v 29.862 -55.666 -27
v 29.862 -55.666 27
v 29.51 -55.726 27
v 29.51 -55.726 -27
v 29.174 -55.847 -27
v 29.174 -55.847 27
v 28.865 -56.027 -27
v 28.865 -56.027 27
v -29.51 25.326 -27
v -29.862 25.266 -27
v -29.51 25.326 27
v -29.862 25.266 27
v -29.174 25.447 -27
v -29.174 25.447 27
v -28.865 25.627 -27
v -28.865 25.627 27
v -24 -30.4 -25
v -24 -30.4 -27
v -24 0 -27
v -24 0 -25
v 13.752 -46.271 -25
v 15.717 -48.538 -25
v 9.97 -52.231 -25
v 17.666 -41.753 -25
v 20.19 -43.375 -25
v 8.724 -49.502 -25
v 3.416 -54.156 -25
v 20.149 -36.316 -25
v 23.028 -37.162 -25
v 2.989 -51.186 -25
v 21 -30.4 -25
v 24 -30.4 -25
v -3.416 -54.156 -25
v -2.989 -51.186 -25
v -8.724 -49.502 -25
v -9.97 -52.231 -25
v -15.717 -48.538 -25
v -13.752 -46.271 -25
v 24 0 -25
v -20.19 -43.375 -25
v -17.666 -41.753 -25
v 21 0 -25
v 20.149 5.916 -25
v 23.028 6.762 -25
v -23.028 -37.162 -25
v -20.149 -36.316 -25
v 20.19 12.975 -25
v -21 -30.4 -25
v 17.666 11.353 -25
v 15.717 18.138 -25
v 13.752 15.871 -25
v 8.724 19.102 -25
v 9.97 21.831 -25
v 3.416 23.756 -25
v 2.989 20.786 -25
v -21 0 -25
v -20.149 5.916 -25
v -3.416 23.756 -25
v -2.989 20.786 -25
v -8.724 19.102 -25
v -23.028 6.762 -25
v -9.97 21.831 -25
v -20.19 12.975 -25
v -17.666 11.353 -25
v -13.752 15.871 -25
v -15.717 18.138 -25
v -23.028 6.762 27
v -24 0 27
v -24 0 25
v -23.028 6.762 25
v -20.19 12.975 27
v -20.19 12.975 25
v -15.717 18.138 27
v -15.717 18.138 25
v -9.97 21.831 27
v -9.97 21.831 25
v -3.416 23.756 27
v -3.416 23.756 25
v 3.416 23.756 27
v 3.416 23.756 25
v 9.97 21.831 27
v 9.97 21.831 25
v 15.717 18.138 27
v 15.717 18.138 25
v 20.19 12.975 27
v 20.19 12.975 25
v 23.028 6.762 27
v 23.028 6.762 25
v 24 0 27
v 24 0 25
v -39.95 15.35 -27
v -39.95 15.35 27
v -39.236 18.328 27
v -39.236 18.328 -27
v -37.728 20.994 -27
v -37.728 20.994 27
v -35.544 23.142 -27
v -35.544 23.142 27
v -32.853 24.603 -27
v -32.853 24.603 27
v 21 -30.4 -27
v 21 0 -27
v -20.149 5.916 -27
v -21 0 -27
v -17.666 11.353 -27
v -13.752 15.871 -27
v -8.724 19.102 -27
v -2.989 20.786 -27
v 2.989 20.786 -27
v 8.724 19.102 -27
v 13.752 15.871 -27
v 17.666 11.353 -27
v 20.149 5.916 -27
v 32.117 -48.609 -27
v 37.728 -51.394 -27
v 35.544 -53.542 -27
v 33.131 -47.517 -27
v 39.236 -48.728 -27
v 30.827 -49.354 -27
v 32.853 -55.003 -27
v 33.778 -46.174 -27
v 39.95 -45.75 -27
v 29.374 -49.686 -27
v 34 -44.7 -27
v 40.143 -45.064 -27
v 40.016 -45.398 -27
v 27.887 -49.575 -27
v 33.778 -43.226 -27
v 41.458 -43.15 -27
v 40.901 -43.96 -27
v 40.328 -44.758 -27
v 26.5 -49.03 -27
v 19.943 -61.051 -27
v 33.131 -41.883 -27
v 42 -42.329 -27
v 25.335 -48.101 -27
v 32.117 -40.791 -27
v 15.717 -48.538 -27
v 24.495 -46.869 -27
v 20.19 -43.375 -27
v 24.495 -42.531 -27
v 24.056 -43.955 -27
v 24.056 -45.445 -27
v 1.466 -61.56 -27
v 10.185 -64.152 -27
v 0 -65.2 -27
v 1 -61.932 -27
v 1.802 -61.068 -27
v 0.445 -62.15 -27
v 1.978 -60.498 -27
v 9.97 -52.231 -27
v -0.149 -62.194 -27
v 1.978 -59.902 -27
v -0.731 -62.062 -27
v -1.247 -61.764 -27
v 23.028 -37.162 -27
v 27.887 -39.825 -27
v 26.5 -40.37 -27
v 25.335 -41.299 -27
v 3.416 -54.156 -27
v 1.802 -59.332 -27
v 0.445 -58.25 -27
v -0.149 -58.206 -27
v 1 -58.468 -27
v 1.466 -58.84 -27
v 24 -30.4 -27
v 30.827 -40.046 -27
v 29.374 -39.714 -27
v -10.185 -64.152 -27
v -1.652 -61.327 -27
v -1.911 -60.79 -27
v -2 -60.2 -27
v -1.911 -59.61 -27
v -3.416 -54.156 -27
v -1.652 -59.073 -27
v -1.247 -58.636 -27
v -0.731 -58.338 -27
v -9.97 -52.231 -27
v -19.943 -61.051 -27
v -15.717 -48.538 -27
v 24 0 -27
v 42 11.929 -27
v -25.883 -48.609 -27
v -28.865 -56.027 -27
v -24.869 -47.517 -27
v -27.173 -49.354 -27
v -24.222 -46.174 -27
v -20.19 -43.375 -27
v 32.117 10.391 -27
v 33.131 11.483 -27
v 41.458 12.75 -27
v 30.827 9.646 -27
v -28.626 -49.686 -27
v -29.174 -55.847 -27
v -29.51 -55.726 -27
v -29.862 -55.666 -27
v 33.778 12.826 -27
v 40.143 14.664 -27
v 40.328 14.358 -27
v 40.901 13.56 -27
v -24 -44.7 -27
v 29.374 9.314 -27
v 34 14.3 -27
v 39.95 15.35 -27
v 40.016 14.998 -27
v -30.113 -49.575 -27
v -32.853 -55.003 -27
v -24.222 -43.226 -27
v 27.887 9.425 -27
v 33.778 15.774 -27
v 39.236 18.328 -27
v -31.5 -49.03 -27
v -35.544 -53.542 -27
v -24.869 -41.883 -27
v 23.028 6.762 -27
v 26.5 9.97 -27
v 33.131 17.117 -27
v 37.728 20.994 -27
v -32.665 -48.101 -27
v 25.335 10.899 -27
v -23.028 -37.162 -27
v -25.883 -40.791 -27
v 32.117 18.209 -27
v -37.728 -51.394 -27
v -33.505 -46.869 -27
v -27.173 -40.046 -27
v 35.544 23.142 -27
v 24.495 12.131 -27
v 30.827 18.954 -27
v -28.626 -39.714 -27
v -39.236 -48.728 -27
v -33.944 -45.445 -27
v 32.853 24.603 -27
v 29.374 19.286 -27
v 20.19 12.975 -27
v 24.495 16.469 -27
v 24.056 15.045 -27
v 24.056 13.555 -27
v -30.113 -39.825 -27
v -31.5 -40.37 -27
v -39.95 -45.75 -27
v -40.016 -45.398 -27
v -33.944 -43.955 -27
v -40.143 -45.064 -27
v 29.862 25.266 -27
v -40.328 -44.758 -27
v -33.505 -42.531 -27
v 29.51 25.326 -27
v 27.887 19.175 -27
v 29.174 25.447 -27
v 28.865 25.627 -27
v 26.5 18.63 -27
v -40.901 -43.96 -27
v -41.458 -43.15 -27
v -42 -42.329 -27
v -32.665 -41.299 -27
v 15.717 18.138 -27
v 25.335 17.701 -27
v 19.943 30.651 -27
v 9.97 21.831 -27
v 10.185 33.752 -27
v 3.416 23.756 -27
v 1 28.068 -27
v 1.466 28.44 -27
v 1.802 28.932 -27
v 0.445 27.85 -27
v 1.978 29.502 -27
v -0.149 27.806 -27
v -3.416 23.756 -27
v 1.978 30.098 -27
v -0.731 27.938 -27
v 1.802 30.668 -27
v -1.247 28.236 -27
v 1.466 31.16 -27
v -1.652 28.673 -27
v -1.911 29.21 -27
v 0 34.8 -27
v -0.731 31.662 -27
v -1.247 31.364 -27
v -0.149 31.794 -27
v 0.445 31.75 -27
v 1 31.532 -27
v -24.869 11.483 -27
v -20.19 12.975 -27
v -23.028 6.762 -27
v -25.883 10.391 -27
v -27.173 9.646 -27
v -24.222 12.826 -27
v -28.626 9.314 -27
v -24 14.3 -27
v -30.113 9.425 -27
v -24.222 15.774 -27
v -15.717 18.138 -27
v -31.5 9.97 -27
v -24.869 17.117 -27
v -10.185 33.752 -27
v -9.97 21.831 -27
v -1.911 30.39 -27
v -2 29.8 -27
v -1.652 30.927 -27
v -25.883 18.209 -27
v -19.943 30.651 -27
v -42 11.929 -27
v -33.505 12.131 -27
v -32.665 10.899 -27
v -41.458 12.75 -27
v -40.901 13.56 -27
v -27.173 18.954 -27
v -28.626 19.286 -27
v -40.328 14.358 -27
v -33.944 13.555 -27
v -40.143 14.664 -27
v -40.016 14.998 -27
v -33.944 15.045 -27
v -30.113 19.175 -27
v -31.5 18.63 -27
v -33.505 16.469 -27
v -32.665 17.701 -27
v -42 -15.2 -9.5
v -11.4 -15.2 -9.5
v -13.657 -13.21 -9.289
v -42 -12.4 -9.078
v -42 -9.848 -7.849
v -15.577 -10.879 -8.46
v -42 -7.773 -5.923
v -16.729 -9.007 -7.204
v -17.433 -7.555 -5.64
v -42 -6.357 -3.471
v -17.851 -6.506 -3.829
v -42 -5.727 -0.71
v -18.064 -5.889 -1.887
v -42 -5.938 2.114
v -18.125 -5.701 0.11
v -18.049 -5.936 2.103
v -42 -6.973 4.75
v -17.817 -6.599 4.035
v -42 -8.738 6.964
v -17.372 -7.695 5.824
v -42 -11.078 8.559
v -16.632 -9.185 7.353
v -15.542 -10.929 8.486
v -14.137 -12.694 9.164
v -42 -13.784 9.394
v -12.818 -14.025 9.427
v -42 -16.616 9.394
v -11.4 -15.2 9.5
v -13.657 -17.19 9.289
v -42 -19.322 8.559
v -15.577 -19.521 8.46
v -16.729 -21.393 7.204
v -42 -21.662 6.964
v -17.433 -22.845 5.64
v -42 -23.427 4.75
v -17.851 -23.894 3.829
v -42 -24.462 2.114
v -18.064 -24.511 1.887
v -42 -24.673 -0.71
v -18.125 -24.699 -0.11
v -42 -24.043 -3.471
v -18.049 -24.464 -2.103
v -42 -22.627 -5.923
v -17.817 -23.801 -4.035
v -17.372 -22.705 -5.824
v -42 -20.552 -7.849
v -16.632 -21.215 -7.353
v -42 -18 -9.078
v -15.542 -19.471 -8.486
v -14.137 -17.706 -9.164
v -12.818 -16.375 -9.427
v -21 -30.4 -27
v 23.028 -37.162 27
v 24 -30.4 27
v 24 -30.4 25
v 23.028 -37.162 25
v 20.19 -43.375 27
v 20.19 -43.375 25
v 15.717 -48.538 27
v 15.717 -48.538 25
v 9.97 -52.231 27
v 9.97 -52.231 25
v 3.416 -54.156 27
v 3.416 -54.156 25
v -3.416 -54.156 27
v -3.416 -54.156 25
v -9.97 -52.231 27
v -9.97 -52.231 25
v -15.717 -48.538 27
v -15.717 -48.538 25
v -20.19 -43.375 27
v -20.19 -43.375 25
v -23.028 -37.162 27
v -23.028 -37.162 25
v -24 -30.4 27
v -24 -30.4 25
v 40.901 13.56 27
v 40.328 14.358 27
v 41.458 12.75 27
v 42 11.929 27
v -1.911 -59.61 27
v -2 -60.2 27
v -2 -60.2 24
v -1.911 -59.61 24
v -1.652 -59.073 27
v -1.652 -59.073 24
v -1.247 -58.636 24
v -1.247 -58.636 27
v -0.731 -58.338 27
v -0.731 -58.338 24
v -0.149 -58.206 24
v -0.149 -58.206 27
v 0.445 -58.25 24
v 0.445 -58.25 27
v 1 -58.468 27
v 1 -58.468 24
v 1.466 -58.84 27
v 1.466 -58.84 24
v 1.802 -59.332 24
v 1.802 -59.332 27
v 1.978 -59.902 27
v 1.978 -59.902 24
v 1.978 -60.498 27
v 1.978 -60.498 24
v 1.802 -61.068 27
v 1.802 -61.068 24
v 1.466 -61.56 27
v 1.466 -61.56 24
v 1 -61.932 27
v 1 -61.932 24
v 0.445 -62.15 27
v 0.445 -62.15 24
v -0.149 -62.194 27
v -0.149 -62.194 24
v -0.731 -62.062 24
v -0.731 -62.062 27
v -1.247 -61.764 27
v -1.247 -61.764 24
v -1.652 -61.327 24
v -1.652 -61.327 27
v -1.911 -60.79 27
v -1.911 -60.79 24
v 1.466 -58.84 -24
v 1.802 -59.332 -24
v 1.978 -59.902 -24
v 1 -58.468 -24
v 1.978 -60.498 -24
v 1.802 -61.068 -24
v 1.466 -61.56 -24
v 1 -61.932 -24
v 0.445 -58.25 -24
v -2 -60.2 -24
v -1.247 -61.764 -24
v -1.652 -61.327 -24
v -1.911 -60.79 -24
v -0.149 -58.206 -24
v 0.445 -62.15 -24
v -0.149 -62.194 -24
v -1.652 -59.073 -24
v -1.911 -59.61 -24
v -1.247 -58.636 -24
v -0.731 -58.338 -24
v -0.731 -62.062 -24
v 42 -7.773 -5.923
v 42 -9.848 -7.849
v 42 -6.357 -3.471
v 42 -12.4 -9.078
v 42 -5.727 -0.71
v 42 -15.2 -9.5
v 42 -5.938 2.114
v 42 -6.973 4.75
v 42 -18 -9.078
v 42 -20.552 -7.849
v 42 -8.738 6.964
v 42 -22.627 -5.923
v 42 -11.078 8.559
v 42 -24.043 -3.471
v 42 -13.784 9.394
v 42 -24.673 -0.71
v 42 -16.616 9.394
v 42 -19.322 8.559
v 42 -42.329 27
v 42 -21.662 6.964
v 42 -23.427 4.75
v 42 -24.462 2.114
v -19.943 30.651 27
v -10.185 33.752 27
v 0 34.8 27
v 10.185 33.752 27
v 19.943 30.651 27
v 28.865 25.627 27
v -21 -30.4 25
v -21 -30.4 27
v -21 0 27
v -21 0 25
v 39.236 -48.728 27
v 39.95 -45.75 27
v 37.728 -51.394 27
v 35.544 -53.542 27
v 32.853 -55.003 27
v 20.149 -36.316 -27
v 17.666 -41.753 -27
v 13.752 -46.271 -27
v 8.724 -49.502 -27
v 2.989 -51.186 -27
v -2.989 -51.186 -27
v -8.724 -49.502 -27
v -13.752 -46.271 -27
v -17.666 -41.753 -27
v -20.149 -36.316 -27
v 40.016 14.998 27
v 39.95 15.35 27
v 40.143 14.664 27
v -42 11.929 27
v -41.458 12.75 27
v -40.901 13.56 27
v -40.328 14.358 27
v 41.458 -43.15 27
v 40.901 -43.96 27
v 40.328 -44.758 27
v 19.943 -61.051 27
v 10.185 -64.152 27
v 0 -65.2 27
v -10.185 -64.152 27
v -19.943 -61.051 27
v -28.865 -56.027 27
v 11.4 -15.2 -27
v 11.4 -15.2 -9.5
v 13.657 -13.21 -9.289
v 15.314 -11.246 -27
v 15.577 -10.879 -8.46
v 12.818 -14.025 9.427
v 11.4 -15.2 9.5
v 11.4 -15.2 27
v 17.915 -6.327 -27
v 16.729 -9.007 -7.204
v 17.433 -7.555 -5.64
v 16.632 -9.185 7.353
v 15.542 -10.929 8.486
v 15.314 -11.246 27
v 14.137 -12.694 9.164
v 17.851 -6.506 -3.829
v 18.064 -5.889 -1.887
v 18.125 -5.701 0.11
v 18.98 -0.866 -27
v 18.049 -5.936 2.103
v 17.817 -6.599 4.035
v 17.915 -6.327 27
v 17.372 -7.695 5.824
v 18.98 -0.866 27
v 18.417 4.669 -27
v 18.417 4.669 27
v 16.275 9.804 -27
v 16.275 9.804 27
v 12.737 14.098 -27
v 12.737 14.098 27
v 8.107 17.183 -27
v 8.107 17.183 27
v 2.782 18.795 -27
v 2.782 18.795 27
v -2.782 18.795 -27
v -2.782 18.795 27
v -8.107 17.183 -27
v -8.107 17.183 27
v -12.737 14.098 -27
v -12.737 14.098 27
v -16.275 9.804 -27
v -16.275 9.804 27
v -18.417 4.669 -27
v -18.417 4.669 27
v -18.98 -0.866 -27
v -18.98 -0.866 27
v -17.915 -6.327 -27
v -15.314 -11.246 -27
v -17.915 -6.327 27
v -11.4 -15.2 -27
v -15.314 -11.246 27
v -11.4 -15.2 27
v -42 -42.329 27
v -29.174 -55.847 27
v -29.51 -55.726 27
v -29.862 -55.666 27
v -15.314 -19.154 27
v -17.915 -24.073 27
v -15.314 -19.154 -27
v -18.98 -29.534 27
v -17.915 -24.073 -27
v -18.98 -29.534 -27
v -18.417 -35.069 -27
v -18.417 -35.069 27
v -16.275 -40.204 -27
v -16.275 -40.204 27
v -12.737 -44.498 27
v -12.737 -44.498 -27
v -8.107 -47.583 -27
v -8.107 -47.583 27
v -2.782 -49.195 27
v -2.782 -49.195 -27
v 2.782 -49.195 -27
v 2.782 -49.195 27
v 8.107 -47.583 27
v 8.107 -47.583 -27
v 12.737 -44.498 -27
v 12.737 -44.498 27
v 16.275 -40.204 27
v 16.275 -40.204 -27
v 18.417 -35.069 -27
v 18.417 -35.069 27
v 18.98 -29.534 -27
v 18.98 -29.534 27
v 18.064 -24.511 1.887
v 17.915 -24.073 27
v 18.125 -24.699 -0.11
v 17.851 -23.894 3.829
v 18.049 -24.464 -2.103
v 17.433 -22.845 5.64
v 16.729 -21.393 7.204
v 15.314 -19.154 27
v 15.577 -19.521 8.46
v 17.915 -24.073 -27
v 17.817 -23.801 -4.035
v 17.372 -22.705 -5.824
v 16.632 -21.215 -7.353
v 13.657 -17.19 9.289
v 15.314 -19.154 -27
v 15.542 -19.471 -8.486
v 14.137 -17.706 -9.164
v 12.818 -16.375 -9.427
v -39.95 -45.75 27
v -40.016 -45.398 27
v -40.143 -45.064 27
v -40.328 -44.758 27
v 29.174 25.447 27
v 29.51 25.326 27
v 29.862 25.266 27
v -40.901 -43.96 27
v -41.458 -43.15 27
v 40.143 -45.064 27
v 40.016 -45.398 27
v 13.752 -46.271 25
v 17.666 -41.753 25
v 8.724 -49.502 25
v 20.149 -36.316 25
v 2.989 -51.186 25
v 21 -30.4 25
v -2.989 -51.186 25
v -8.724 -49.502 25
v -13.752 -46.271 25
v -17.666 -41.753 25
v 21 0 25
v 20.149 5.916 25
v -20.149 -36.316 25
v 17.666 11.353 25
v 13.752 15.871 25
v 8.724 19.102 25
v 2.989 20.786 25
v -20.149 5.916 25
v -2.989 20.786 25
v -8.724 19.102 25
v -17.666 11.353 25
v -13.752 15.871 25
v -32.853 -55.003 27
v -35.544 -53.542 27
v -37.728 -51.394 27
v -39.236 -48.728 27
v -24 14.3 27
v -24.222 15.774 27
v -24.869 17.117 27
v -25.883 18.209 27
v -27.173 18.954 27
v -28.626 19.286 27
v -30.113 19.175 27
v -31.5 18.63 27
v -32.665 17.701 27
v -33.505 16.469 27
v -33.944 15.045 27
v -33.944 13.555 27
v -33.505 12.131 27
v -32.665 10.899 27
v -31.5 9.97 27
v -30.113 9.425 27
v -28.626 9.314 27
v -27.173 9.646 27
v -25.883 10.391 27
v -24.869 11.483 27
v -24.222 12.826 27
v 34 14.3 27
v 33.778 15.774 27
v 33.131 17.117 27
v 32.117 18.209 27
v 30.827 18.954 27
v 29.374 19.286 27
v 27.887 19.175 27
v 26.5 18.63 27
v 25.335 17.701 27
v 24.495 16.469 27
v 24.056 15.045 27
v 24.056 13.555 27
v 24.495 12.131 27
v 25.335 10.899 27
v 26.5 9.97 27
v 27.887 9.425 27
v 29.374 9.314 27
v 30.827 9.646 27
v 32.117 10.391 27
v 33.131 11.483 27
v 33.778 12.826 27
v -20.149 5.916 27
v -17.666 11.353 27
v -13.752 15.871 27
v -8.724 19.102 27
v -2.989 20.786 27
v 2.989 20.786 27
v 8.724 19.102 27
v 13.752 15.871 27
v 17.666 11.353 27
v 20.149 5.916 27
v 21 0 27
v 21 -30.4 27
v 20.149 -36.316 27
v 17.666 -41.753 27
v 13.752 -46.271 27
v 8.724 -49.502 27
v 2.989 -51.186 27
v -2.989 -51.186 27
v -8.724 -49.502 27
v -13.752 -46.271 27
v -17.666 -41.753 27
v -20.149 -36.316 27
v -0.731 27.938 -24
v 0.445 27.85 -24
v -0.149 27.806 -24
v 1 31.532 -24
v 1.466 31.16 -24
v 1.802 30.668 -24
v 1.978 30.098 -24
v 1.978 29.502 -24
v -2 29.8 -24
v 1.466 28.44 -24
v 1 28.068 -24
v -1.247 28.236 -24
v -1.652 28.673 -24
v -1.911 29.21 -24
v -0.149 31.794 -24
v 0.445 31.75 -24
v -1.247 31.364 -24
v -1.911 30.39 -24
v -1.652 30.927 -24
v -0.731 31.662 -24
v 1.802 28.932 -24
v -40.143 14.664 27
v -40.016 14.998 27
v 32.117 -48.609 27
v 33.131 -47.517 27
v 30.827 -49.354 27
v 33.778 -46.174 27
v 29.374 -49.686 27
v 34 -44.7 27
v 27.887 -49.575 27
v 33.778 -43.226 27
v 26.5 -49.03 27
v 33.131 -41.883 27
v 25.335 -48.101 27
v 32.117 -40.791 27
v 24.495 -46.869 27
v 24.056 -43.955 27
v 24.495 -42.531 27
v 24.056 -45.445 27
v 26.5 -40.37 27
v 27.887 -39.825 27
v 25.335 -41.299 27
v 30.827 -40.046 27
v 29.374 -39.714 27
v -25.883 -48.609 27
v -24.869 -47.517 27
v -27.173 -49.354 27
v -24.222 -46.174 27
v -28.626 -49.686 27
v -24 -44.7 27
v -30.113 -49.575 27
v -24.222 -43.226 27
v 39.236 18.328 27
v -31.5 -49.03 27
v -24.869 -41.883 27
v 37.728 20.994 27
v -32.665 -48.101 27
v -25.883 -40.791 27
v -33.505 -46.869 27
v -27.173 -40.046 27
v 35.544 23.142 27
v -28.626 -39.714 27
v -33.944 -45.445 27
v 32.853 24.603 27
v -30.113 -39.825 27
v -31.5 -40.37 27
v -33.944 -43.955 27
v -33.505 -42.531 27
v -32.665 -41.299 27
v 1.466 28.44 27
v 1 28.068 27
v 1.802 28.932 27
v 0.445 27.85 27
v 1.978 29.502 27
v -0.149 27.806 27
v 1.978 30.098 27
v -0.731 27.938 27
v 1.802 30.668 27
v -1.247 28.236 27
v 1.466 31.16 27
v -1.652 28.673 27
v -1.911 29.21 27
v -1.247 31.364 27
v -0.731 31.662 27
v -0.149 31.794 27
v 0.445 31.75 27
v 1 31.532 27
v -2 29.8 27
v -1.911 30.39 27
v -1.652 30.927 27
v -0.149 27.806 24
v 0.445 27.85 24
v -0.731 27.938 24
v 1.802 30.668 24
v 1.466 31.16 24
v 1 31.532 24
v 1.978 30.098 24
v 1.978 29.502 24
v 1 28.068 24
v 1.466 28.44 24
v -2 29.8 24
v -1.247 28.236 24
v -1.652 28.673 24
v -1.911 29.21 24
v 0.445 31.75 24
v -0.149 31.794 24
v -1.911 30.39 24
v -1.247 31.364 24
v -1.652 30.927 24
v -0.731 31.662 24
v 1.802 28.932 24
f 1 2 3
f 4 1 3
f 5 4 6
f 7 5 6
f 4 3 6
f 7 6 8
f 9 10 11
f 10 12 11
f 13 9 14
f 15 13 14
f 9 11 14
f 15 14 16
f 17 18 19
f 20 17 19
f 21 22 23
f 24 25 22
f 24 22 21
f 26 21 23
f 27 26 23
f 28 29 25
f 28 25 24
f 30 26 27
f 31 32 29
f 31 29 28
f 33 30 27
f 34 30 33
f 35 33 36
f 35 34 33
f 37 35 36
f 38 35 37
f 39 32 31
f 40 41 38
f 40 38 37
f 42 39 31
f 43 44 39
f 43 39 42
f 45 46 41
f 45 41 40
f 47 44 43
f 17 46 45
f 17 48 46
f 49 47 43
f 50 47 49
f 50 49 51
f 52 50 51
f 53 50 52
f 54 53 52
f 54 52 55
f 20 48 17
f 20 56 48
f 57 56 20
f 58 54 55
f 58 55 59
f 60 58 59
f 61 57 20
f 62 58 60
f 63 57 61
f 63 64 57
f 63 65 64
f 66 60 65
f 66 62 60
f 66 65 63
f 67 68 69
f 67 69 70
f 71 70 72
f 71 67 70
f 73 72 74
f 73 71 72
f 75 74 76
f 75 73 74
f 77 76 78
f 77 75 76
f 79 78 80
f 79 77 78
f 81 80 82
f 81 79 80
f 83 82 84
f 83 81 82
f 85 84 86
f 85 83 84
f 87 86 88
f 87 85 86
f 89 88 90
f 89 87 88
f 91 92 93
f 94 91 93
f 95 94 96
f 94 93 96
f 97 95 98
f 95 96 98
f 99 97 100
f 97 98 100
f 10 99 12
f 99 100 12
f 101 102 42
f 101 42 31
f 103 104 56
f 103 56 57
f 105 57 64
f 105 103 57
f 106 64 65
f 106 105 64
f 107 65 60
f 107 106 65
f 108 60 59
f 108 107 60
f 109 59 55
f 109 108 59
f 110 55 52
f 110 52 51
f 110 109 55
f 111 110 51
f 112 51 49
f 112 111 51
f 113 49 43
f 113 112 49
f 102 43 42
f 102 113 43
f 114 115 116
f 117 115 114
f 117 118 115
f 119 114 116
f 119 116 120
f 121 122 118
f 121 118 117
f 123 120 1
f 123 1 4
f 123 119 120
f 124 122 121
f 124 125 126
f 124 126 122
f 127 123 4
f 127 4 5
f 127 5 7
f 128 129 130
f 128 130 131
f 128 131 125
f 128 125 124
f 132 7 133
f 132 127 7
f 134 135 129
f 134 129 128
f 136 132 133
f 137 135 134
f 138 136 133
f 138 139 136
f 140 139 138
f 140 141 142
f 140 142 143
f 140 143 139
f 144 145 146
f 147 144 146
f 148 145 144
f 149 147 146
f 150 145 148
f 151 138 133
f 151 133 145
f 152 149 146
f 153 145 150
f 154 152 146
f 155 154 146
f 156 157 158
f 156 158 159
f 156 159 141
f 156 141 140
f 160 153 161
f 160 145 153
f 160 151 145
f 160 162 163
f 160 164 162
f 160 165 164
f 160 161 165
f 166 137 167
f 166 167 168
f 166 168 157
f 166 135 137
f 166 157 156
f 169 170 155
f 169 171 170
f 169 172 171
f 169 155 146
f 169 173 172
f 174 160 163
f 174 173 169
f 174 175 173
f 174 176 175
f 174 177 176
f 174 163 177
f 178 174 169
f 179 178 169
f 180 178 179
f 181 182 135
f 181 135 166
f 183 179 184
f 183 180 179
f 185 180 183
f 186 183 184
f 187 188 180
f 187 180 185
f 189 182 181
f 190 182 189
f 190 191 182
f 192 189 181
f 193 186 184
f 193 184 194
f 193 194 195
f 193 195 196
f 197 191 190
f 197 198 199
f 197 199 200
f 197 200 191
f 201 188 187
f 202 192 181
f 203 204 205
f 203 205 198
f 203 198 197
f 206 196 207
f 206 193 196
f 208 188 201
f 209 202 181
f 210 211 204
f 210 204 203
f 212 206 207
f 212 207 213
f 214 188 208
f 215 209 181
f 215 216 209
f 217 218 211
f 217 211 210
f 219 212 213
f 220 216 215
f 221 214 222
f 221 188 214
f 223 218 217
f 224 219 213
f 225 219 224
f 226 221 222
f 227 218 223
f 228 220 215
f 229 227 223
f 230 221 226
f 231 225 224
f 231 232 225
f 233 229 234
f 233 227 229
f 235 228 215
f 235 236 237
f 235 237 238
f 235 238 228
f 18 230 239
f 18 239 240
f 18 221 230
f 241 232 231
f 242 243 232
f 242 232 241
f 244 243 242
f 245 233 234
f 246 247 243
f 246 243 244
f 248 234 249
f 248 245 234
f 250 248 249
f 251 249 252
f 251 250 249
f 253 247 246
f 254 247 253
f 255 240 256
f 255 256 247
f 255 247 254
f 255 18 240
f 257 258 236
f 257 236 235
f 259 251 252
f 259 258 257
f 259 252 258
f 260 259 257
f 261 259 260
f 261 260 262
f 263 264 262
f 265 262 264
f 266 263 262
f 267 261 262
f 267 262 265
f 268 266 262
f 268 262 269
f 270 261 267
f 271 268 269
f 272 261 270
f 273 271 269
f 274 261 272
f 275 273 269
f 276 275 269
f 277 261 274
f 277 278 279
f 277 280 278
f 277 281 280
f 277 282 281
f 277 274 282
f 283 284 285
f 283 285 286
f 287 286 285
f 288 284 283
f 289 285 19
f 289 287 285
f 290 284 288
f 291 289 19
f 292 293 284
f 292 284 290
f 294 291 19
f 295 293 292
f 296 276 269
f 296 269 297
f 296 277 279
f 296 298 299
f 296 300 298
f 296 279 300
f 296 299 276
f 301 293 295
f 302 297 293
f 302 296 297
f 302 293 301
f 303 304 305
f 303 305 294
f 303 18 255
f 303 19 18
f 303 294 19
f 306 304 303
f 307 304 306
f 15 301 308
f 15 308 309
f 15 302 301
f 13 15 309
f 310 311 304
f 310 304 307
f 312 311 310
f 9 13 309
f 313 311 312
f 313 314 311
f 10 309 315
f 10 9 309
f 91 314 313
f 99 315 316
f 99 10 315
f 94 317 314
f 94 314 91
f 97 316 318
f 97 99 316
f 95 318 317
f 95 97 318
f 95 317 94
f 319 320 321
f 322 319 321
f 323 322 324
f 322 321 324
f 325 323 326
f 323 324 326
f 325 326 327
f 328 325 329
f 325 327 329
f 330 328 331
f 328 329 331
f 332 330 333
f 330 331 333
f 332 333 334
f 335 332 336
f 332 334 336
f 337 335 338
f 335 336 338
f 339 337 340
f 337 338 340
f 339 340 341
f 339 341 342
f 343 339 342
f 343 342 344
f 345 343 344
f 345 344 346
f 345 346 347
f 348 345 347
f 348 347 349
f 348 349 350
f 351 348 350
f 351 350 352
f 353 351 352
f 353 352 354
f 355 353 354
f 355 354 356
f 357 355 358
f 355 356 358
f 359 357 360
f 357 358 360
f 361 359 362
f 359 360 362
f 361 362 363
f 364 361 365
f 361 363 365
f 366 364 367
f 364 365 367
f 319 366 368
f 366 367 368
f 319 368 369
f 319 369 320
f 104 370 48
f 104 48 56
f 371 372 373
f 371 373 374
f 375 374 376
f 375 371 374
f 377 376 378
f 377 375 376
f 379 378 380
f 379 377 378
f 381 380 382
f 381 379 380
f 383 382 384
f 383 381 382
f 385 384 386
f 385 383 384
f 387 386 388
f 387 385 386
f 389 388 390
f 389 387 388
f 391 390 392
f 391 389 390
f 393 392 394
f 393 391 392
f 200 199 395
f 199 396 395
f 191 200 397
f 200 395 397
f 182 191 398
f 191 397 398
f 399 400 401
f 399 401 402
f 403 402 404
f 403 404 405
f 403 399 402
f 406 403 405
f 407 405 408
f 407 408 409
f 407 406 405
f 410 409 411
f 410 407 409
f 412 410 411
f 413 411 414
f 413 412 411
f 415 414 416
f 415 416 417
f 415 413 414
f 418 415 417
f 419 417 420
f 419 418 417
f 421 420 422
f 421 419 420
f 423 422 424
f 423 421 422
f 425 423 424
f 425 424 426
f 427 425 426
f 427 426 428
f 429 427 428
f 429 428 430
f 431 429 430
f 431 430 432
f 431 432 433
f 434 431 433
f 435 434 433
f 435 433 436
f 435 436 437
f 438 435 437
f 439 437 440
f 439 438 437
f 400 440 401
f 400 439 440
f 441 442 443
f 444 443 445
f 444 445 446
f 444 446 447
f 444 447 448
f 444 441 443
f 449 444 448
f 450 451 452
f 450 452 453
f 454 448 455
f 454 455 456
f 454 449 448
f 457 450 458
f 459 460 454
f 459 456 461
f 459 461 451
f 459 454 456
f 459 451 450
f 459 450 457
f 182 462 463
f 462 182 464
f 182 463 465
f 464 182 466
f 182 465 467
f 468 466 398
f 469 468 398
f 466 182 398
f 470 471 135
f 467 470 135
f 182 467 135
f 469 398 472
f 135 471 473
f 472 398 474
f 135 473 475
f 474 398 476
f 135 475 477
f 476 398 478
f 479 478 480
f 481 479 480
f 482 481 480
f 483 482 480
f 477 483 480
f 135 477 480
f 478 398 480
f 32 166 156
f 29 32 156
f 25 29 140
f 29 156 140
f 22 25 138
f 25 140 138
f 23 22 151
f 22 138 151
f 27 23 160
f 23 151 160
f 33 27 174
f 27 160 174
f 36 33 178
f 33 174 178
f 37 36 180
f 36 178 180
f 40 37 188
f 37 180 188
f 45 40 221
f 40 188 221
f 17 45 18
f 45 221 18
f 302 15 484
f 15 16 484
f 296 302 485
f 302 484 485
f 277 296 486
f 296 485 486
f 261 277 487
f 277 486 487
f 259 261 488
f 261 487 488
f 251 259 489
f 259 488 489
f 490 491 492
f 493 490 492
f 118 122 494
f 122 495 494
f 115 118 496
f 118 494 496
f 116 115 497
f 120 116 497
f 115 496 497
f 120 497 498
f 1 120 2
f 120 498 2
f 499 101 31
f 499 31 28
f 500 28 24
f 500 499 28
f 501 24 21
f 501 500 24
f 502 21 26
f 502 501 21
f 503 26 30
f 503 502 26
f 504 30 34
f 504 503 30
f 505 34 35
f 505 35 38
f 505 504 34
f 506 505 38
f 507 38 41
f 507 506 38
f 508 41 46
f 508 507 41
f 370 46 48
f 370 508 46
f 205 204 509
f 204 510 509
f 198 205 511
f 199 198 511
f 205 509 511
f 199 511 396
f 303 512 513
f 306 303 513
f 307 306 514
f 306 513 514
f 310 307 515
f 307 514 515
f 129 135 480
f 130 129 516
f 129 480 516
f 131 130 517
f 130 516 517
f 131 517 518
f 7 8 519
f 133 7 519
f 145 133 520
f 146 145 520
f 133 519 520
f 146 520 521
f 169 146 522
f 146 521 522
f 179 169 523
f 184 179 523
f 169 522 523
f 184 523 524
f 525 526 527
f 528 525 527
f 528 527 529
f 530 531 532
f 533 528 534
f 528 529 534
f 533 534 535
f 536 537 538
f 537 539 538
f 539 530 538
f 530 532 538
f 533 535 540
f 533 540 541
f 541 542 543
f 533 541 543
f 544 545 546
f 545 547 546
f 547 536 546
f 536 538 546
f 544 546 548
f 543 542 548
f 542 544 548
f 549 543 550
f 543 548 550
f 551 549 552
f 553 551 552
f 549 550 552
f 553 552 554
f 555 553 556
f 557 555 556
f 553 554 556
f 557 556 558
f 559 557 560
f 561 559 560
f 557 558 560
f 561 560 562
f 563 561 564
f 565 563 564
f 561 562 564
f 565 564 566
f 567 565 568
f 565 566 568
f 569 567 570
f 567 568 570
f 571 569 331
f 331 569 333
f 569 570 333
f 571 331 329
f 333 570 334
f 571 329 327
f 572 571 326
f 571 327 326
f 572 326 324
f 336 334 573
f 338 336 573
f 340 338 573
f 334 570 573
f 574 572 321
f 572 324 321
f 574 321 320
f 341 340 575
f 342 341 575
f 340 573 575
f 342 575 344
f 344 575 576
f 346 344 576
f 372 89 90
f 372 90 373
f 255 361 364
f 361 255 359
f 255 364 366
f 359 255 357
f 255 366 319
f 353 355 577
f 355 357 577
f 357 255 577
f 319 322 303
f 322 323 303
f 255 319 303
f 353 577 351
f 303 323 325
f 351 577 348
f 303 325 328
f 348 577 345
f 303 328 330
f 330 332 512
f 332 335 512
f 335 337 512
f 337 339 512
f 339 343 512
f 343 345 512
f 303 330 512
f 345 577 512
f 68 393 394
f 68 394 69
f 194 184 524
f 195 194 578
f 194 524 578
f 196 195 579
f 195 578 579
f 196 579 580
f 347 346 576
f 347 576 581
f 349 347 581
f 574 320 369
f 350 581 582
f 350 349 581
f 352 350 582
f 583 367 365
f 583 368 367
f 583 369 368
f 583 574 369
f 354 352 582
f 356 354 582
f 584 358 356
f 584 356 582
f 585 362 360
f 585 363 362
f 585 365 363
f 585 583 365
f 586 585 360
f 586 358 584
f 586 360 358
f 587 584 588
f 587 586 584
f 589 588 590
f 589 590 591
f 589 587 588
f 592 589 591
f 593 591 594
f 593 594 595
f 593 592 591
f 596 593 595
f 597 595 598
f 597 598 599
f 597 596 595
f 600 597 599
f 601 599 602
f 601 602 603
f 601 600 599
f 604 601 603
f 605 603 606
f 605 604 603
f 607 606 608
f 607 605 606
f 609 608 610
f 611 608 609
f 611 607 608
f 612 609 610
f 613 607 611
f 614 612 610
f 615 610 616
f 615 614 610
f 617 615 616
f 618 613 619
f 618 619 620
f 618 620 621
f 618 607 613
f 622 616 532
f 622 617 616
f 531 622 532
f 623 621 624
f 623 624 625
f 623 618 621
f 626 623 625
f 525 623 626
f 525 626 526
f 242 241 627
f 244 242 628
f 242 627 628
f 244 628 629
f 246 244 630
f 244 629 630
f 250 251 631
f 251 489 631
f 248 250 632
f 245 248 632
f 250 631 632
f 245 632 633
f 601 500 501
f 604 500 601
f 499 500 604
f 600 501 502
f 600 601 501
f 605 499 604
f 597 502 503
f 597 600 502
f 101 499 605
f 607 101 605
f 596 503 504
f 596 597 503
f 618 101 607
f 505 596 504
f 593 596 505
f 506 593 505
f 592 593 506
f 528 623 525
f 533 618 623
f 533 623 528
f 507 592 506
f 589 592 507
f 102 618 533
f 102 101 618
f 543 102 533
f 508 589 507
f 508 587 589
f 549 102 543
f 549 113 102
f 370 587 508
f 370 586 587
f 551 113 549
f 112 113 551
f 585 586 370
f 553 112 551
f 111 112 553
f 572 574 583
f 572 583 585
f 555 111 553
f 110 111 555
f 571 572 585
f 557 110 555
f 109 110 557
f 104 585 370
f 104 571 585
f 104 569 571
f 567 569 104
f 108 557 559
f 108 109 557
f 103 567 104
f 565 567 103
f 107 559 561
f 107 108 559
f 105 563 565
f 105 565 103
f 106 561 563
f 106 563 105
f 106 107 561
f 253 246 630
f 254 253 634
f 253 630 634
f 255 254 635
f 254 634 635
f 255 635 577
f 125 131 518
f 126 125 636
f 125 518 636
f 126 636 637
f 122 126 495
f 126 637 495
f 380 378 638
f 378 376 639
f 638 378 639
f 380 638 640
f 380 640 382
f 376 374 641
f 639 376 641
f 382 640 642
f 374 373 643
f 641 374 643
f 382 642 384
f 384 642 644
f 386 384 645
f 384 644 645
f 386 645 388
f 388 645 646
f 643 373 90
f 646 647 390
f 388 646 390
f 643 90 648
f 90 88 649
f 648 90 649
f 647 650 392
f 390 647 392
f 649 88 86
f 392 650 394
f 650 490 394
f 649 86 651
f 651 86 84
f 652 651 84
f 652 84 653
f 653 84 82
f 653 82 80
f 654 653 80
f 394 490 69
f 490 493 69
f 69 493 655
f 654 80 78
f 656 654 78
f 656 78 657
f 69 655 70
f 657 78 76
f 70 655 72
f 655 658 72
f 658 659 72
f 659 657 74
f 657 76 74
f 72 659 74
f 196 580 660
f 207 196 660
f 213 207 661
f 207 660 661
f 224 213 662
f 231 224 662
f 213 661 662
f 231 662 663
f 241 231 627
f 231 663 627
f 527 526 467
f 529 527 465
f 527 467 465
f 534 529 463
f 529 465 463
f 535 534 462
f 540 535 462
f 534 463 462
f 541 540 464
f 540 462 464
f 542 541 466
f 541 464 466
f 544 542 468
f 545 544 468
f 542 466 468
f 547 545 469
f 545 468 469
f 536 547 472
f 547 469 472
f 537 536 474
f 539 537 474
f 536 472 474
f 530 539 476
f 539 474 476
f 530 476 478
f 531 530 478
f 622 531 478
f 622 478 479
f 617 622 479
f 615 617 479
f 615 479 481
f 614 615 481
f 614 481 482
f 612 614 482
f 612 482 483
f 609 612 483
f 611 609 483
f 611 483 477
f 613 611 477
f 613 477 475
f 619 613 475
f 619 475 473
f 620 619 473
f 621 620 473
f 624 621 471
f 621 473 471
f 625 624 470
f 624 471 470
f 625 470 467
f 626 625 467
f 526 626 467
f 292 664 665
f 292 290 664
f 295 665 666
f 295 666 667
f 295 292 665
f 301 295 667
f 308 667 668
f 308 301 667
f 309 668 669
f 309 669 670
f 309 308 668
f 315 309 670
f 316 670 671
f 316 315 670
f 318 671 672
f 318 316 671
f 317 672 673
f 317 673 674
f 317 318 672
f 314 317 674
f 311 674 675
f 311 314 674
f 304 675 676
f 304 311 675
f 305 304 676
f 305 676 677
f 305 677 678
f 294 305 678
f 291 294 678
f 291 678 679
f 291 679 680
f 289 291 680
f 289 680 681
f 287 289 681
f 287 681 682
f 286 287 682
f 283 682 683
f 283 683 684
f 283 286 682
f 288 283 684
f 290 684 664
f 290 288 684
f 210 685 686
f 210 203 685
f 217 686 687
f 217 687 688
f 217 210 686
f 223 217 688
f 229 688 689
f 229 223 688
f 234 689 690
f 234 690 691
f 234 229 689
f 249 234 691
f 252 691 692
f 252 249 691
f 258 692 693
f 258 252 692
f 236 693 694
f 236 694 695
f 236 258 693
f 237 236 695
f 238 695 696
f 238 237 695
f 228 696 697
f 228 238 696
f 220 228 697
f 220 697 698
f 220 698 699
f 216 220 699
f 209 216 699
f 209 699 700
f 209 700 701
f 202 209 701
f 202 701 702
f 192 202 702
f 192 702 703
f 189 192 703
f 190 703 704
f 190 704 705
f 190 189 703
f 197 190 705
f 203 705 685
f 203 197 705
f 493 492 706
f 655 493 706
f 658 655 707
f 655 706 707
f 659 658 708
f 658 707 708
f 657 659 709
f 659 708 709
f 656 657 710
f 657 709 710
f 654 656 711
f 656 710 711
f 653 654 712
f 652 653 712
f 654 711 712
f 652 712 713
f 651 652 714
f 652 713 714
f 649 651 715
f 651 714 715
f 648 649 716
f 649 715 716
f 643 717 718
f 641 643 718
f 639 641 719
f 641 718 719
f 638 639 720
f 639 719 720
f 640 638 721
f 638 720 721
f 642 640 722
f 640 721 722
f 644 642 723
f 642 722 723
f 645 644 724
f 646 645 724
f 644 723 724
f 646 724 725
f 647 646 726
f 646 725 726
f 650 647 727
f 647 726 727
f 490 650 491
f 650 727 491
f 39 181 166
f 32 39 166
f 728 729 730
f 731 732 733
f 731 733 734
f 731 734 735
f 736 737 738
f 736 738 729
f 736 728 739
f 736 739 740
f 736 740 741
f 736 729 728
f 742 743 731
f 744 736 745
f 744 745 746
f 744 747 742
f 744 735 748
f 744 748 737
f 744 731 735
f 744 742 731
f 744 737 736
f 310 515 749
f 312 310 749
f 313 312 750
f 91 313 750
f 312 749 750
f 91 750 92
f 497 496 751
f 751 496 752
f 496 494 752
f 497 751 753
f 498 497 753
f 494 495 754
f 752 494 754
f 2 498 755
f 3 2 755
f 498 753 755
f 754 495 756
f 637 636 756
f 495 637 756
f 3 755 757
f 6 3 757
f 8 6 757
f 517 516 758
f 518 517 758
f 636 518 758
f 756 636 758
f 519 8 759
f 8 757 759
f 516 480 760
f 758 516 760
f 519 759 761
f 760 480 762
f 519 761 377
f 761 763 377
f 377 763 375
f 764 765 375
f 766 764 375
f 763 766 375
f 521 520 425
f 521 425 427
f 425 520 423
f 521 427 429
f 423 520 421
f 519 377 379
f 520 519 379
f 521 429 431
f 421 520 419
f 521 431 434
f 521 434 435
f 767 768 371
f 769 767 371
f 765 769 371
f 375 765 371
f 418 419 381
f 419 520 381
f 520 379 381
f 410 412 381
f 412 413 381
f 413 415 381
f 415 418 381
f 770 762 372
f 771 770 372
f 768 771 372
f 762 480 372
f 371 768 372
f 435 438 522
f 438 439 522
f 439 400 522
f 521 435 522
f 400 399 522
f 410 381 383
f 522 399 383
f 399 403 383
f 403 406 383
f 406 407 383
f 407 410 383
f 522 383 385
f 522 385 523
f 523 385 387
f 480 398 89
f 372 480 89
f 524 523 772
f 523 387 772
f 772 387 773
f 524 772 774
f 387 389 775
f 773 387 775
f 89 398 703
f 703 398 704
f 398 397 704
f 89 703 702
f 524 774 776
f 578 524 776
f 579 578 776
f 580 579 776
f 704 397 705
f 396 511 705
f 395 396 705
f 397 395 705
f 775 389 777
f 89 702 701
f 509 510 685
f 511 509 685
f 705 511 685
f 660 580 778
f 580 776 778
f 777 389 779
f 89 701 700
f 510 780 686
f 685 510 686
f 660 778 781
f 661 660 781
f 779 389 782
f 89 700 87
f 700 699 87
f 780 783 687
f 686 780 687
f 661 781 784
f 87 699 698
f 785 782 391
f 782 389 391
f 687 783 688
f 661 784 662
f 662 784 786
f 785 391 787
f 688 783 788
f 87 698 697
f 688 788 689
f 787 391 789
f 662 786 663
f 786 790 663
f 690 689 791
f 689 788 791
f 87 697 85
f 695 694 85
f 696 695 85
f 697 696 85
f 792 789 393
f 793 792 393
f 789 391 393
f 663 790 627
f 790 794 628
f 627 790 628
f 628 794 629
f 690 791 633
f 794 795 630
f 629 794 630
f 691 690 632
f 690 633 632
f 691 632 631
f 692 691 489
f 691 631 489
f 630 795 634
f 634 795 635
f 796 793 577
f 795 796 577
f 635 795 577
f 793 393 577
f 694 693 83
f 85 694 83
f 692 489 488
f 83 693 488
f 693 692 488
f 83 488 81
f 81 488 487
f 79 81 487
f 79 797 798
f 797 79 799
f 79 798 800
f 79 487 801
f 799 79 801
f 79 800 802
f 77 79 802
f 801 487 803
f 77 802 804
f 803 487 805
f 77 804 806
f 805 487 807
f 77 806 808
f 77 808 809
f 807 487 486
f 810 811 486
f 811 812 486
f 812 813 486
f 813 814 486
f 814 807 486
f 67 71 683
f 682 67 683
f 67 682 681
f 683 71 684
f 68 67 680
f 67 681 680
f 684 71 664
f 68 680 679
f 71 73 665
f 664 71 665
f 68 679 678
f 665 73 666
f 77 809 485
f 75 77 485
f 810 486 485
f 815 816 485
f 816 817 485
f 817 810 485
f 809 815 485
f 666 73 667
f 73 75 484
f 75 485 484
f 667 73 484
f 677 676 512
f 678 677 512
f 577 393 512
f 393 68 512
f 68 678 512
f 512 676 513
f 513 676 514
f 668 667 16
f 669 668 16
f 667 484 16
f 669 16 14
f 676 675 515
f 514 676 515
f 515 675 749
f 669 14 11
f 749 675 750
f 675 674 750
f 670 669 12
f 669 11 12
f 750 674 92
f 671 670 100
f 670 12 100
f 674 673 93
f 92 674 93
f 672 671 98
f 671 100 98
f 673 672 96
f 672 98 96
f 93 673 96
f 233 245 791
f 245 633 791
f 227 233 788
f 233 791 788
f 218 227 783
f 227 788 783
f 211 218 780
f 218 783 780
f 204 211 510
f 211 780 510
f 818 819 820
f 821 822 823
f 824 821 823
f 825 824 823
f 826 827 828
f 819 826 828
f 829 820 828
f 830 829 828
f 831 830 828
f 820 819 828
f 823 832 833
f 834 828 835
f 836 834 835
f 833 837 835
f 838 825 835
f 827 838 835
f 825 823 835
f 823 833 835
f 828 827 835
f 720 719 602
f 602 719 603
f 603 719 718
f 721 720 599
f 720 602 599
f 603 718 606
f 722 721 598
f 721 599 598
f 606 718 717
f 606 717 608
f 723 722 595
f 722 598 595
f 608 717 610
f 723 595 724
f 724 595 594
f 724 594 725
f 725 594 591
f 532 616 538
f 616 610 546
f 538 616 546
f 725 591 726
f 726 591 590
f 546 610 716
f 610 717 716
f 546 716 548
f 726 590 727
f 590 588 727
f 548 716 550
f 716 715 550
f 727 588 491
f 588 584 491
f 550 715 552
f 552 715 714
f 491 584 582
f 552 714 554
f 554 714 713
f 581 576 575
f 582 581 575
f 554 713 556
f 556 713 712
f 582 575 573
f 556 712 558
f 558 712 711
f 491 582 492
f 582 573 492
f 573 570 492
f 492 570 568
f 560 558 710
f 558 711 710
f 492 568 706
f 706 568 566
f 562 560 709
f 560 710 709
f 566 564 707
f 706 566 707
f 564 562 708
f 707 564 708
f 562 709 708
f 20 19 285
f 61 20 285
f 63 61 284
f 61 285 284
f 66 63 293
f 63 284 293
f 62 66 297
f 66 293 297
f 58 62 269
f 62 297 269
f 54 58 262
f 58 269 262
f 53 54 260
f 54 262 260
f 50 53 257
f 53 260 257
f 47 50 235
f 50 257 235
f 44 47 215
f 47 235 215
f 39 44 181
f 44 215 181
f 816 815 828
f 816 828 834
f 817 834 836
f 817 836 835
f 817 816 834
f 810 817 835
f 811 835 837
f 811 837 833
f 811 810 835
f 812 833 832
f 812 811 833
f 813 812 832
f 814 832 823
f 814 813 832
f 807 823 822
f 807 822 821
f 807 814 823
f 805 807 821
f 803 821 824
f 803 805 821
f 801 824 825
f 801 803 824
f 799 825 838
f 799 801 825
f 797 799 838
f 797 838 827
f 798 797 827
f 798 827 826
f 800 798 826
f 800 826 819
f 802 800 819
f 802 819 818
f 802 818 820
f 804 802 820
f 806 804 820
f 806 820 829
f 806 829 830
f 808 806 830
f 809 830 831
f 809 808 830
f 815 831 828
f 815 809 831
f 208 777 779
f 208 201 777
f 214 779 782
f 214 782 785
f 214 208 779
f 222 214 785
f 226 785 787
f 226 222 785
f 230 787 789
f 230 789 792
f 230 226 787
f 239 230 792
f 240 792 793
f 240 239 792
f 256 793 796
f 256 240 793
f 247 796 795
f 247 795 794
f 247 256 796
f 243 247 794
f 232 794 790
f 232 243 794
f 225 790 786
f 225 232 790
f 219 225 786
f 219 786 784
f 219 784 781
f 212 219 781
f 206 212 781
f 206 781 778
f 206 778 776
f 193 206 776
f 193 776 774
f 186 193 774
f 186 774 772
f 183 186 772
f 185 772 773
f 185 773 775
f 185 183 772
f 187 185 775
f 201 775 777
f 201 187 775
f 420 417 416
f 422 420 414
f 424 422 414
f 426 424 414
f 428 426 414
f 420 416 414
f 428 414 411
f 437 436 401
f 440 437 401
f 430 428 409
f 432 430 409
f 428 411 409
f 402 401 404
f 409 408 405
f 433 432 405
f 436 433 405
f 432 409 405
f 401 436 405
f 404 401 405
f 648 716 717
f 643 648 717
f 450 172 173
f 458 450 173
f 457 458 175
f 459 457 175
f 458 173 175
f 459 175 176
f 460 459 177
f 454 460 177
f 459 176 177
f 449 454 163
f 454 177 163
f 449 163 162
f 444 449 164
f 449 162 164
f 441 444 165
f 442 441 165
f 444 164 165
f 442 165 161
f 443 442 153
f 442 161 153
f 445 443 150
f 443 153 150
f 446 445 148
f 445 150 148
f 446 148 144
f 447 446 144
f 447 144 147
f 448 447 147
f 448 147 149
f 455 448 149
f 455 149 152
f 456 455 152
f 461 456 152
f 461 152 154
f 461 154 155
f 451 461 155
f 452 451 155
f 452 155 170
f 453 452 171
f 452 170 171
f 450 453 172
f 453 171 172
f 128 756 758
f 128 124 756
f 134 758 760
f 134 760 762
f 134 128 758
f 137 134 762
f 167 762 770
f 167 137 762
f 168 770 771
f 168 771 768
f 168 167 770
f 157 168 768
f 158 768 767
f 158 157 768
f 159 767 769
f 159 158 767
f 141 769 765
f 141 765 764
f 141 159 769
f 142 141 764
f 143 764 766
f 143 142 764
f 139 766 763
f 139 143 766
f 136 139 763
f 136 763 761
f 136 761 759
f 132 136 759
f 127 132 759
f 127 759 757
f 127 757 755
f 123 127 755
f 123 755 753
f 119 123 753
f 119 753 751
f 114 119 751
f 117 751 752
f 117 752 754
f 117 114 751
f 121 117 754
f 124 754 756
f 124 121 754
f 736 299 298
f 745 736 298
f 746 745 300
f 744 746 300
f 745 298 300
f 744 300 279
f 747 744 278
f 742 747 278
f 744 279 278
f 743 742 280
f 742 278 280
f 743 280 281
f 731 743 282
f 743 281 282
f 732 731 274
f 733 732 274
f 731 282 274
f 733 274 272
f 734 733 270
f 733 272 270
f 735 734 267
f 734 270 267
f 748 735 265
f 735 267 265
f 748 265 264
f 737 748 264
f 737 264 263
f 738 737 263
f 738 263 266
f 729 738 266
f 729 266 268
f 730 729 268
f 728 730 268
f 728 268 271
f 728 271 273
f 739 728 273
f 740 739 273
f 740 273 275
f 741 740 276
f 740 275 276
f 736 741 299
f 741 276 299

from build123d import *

# Parameters (mm, degrees)
SKETCH2_R           = 5
BOSS_EXTRUDE1_DEPTH = 27
SKETCH3_R           = 9.5
CUT_EXTRUDE2_DEPTH  = 85
CUT_EXTRUDE3_DEPTH  = 2
SKETCH6_R           = 2
CUT_EXTRUDE4_DEPTH  = 3


with BuildPart() as part:
    # Sketch2 → Boss-Extrude1 (new body, symmetric)
    with BuildSketch(Plane.XY):
        with BuildLine():
            ThreePointArc((-39.949803133, 15.349672018), (-36.711412809, 22.144368202), (-29.86235622, 25.266145255))
            ThreePointArc((-29.86235622, 25.266145255), (-29.339100999, 25.379156062), (-28.864565634, 25.626913314))
            ThreePointArc((-28.864565634, 25.626913314), (0, 34.8), (28.864565634, 25.626913314))
            ThreePointArc((28.864565634, 25.626913314), (29.339100999, 25.379156062), (29.86235622, 25.266145255))
            ThreePointArc((29.86235622, 25.266145255), (36.711412809, 22.144368202), (39.949803133, 15.349672018))
            ThreePointArc((39.949803133, 15.349672018), (40.071741311, 14.828424908), (40.32757349, 14.358193726))
            ThreePointArc((40.32757349, 14.358193726), (41.181697345, 13.15608936), (42, 11.929319933))
            Line((42, 11.929319933), (42, -42.329319933))
            ThreePointArc((42, -42.329319933), (41.181697345, -43.55608936), (40.32757349, -44.758193726))
            ThreePointArc((40.32757349, -44.758193726), (40.071741311, -45.228424908), (39.949803133, -45.749672018))
            ThreePointArc((39.949803133, -45.749672018), (36.711412809, -52.544368202), (29.86235622, -55.666145255))
            ThreePointArc((29.86235622, -55.666145255), (29.339100999, -55.779156062), (28.864565634, -56.026913314))
            ThreePointArc((28.864565634, -56.026913314), (0, -65.2), (-28.864565634, -56.026913314))
            ThreePointArc((-28.864565634, -56.026913314), (-29.339100999, -55.779156062), (-29.86235622, -55.666145255))
            ThreePointArc((-29.86235622, -55.666145255), (-36.711412809, -52.544368202), (-39.949803133, -45.749672018))
            ThreePointArc((-39.949803133, -45.749672018), (-40.071741311, -45.228424908), (-40.32757349, -44.758193726))
            ThreePointArc((-40.32757349, -44.758193726), (-41.181697345, -43.55608936), (-42, -42.329319933))
            Line((-42, -42.329319933), (-42, 11.929319933))
            ThreePointArc((-42, 11.929319933), (-41.181697345, 13.15608936), (-40.32757349, 14.358193726))
            ThreePointArc((-40.32757349, 14.358193726), (-40.071741311, 14.828424908), (-39.949803133, 15.349672018))
        make_face()
        with Locations((-29, -44.7)):
            Circle(SKETCH2_R, mode=Mode.SUBTRACT)
        with Locations((-29, 14.3)):
            Circle(SKETCH2_R, mode=Mode.SUBTRACT)
        with Locations((29, -44.7)):
            Circle(SKETCH2_R, mode=Mode.SUBTRACT)
        with Locations((29, 14.3)):
            Circle(SKETCH2_R, mode=Mode.SUBTRACT)
        with BuildLine():
            ThreePointArc((-11.4, -15.2), (0, -49.4), (11.4, -15.2))
            ThreePointArc((11.4, -15.2), (0, 19), (-11.4, -15.2))
        make_face(mode=Mode.SUBTRACT)
    extrude(amount=BOSS_EXTRUDE1_DEPTH, both=True)

    # Sketch3 → Cut-Extrude2 (cut, through all)
    with BuildSketch(Plane(origin=(42, 0, 0), x_dir=(0, 0, -1), z_dir=(1, 0, 0))):
        with Locations((0, -15.2)):
            Circle(SKETCH3_R)
    extrude(amount=-CUT_EXTRUDE2_DEPTH, mode=Mode.SUBTRACT)

    # Sketch5 → Cut-Extrude3 (cut)
    with BuildSketch(Plane(origin=(0, 0, -27), x_dir=(-1, 0, 0), z_dir=(0, 0, -1))):
        with BuildLine():
            Line((-24, 0), (-24, -30.4))
            ThreePointArc((-24, -30.4), (0, -54.4), (24, -30.4))
            Line((24, -30.4), (24, 0))
            ThreePointArc((24, 0), (0, 24), (-24, 0))
        make_face()
        with BuildLine():
            Line((-21, 0), (-21, -30.4))
            ThreePointArc((-21, -30.4), (0, -51.4), (21, -30.4))
            Line((21, -30.4), (21, 0))
            ThreePointArc((21, 0), (0, 21), (-21, 0))
        make_face(mode=Mode.SUBTRACT)
    cut_extrude3 = extrude(amount=-CUT_EXTRUDE3_DEPTH, mode=Mode.SUBTRACT)

    # Sketch6 → Cut-Extrude4 (cut)
    with BuildSketch(Plane(origin=(0, 0, -27), x_dir=(-1, 0, 0), z_dir=(0, 0, -1))):
        with Locations((0, 29.8)):
            Circle(SKETCH6_R)
        with Locations((0, -60.2)):
            Circle(SKETCH6_R)
    cut_extrude4 = extrude(amount=-CUT_EXTRUDE4_DEPTH, mode=Mode.SUBTRACT)

    # Mirror1: Cut-Extrude3, Cut-Extrude4 across plane
    add(cut_extrude3.mirror(Plane.XY), mode=Mode.SUBTRACT)
    add(cut_extrude4.mirror(Plane.XY), mode=Mode.SUBTRACT)


solid = part.part
